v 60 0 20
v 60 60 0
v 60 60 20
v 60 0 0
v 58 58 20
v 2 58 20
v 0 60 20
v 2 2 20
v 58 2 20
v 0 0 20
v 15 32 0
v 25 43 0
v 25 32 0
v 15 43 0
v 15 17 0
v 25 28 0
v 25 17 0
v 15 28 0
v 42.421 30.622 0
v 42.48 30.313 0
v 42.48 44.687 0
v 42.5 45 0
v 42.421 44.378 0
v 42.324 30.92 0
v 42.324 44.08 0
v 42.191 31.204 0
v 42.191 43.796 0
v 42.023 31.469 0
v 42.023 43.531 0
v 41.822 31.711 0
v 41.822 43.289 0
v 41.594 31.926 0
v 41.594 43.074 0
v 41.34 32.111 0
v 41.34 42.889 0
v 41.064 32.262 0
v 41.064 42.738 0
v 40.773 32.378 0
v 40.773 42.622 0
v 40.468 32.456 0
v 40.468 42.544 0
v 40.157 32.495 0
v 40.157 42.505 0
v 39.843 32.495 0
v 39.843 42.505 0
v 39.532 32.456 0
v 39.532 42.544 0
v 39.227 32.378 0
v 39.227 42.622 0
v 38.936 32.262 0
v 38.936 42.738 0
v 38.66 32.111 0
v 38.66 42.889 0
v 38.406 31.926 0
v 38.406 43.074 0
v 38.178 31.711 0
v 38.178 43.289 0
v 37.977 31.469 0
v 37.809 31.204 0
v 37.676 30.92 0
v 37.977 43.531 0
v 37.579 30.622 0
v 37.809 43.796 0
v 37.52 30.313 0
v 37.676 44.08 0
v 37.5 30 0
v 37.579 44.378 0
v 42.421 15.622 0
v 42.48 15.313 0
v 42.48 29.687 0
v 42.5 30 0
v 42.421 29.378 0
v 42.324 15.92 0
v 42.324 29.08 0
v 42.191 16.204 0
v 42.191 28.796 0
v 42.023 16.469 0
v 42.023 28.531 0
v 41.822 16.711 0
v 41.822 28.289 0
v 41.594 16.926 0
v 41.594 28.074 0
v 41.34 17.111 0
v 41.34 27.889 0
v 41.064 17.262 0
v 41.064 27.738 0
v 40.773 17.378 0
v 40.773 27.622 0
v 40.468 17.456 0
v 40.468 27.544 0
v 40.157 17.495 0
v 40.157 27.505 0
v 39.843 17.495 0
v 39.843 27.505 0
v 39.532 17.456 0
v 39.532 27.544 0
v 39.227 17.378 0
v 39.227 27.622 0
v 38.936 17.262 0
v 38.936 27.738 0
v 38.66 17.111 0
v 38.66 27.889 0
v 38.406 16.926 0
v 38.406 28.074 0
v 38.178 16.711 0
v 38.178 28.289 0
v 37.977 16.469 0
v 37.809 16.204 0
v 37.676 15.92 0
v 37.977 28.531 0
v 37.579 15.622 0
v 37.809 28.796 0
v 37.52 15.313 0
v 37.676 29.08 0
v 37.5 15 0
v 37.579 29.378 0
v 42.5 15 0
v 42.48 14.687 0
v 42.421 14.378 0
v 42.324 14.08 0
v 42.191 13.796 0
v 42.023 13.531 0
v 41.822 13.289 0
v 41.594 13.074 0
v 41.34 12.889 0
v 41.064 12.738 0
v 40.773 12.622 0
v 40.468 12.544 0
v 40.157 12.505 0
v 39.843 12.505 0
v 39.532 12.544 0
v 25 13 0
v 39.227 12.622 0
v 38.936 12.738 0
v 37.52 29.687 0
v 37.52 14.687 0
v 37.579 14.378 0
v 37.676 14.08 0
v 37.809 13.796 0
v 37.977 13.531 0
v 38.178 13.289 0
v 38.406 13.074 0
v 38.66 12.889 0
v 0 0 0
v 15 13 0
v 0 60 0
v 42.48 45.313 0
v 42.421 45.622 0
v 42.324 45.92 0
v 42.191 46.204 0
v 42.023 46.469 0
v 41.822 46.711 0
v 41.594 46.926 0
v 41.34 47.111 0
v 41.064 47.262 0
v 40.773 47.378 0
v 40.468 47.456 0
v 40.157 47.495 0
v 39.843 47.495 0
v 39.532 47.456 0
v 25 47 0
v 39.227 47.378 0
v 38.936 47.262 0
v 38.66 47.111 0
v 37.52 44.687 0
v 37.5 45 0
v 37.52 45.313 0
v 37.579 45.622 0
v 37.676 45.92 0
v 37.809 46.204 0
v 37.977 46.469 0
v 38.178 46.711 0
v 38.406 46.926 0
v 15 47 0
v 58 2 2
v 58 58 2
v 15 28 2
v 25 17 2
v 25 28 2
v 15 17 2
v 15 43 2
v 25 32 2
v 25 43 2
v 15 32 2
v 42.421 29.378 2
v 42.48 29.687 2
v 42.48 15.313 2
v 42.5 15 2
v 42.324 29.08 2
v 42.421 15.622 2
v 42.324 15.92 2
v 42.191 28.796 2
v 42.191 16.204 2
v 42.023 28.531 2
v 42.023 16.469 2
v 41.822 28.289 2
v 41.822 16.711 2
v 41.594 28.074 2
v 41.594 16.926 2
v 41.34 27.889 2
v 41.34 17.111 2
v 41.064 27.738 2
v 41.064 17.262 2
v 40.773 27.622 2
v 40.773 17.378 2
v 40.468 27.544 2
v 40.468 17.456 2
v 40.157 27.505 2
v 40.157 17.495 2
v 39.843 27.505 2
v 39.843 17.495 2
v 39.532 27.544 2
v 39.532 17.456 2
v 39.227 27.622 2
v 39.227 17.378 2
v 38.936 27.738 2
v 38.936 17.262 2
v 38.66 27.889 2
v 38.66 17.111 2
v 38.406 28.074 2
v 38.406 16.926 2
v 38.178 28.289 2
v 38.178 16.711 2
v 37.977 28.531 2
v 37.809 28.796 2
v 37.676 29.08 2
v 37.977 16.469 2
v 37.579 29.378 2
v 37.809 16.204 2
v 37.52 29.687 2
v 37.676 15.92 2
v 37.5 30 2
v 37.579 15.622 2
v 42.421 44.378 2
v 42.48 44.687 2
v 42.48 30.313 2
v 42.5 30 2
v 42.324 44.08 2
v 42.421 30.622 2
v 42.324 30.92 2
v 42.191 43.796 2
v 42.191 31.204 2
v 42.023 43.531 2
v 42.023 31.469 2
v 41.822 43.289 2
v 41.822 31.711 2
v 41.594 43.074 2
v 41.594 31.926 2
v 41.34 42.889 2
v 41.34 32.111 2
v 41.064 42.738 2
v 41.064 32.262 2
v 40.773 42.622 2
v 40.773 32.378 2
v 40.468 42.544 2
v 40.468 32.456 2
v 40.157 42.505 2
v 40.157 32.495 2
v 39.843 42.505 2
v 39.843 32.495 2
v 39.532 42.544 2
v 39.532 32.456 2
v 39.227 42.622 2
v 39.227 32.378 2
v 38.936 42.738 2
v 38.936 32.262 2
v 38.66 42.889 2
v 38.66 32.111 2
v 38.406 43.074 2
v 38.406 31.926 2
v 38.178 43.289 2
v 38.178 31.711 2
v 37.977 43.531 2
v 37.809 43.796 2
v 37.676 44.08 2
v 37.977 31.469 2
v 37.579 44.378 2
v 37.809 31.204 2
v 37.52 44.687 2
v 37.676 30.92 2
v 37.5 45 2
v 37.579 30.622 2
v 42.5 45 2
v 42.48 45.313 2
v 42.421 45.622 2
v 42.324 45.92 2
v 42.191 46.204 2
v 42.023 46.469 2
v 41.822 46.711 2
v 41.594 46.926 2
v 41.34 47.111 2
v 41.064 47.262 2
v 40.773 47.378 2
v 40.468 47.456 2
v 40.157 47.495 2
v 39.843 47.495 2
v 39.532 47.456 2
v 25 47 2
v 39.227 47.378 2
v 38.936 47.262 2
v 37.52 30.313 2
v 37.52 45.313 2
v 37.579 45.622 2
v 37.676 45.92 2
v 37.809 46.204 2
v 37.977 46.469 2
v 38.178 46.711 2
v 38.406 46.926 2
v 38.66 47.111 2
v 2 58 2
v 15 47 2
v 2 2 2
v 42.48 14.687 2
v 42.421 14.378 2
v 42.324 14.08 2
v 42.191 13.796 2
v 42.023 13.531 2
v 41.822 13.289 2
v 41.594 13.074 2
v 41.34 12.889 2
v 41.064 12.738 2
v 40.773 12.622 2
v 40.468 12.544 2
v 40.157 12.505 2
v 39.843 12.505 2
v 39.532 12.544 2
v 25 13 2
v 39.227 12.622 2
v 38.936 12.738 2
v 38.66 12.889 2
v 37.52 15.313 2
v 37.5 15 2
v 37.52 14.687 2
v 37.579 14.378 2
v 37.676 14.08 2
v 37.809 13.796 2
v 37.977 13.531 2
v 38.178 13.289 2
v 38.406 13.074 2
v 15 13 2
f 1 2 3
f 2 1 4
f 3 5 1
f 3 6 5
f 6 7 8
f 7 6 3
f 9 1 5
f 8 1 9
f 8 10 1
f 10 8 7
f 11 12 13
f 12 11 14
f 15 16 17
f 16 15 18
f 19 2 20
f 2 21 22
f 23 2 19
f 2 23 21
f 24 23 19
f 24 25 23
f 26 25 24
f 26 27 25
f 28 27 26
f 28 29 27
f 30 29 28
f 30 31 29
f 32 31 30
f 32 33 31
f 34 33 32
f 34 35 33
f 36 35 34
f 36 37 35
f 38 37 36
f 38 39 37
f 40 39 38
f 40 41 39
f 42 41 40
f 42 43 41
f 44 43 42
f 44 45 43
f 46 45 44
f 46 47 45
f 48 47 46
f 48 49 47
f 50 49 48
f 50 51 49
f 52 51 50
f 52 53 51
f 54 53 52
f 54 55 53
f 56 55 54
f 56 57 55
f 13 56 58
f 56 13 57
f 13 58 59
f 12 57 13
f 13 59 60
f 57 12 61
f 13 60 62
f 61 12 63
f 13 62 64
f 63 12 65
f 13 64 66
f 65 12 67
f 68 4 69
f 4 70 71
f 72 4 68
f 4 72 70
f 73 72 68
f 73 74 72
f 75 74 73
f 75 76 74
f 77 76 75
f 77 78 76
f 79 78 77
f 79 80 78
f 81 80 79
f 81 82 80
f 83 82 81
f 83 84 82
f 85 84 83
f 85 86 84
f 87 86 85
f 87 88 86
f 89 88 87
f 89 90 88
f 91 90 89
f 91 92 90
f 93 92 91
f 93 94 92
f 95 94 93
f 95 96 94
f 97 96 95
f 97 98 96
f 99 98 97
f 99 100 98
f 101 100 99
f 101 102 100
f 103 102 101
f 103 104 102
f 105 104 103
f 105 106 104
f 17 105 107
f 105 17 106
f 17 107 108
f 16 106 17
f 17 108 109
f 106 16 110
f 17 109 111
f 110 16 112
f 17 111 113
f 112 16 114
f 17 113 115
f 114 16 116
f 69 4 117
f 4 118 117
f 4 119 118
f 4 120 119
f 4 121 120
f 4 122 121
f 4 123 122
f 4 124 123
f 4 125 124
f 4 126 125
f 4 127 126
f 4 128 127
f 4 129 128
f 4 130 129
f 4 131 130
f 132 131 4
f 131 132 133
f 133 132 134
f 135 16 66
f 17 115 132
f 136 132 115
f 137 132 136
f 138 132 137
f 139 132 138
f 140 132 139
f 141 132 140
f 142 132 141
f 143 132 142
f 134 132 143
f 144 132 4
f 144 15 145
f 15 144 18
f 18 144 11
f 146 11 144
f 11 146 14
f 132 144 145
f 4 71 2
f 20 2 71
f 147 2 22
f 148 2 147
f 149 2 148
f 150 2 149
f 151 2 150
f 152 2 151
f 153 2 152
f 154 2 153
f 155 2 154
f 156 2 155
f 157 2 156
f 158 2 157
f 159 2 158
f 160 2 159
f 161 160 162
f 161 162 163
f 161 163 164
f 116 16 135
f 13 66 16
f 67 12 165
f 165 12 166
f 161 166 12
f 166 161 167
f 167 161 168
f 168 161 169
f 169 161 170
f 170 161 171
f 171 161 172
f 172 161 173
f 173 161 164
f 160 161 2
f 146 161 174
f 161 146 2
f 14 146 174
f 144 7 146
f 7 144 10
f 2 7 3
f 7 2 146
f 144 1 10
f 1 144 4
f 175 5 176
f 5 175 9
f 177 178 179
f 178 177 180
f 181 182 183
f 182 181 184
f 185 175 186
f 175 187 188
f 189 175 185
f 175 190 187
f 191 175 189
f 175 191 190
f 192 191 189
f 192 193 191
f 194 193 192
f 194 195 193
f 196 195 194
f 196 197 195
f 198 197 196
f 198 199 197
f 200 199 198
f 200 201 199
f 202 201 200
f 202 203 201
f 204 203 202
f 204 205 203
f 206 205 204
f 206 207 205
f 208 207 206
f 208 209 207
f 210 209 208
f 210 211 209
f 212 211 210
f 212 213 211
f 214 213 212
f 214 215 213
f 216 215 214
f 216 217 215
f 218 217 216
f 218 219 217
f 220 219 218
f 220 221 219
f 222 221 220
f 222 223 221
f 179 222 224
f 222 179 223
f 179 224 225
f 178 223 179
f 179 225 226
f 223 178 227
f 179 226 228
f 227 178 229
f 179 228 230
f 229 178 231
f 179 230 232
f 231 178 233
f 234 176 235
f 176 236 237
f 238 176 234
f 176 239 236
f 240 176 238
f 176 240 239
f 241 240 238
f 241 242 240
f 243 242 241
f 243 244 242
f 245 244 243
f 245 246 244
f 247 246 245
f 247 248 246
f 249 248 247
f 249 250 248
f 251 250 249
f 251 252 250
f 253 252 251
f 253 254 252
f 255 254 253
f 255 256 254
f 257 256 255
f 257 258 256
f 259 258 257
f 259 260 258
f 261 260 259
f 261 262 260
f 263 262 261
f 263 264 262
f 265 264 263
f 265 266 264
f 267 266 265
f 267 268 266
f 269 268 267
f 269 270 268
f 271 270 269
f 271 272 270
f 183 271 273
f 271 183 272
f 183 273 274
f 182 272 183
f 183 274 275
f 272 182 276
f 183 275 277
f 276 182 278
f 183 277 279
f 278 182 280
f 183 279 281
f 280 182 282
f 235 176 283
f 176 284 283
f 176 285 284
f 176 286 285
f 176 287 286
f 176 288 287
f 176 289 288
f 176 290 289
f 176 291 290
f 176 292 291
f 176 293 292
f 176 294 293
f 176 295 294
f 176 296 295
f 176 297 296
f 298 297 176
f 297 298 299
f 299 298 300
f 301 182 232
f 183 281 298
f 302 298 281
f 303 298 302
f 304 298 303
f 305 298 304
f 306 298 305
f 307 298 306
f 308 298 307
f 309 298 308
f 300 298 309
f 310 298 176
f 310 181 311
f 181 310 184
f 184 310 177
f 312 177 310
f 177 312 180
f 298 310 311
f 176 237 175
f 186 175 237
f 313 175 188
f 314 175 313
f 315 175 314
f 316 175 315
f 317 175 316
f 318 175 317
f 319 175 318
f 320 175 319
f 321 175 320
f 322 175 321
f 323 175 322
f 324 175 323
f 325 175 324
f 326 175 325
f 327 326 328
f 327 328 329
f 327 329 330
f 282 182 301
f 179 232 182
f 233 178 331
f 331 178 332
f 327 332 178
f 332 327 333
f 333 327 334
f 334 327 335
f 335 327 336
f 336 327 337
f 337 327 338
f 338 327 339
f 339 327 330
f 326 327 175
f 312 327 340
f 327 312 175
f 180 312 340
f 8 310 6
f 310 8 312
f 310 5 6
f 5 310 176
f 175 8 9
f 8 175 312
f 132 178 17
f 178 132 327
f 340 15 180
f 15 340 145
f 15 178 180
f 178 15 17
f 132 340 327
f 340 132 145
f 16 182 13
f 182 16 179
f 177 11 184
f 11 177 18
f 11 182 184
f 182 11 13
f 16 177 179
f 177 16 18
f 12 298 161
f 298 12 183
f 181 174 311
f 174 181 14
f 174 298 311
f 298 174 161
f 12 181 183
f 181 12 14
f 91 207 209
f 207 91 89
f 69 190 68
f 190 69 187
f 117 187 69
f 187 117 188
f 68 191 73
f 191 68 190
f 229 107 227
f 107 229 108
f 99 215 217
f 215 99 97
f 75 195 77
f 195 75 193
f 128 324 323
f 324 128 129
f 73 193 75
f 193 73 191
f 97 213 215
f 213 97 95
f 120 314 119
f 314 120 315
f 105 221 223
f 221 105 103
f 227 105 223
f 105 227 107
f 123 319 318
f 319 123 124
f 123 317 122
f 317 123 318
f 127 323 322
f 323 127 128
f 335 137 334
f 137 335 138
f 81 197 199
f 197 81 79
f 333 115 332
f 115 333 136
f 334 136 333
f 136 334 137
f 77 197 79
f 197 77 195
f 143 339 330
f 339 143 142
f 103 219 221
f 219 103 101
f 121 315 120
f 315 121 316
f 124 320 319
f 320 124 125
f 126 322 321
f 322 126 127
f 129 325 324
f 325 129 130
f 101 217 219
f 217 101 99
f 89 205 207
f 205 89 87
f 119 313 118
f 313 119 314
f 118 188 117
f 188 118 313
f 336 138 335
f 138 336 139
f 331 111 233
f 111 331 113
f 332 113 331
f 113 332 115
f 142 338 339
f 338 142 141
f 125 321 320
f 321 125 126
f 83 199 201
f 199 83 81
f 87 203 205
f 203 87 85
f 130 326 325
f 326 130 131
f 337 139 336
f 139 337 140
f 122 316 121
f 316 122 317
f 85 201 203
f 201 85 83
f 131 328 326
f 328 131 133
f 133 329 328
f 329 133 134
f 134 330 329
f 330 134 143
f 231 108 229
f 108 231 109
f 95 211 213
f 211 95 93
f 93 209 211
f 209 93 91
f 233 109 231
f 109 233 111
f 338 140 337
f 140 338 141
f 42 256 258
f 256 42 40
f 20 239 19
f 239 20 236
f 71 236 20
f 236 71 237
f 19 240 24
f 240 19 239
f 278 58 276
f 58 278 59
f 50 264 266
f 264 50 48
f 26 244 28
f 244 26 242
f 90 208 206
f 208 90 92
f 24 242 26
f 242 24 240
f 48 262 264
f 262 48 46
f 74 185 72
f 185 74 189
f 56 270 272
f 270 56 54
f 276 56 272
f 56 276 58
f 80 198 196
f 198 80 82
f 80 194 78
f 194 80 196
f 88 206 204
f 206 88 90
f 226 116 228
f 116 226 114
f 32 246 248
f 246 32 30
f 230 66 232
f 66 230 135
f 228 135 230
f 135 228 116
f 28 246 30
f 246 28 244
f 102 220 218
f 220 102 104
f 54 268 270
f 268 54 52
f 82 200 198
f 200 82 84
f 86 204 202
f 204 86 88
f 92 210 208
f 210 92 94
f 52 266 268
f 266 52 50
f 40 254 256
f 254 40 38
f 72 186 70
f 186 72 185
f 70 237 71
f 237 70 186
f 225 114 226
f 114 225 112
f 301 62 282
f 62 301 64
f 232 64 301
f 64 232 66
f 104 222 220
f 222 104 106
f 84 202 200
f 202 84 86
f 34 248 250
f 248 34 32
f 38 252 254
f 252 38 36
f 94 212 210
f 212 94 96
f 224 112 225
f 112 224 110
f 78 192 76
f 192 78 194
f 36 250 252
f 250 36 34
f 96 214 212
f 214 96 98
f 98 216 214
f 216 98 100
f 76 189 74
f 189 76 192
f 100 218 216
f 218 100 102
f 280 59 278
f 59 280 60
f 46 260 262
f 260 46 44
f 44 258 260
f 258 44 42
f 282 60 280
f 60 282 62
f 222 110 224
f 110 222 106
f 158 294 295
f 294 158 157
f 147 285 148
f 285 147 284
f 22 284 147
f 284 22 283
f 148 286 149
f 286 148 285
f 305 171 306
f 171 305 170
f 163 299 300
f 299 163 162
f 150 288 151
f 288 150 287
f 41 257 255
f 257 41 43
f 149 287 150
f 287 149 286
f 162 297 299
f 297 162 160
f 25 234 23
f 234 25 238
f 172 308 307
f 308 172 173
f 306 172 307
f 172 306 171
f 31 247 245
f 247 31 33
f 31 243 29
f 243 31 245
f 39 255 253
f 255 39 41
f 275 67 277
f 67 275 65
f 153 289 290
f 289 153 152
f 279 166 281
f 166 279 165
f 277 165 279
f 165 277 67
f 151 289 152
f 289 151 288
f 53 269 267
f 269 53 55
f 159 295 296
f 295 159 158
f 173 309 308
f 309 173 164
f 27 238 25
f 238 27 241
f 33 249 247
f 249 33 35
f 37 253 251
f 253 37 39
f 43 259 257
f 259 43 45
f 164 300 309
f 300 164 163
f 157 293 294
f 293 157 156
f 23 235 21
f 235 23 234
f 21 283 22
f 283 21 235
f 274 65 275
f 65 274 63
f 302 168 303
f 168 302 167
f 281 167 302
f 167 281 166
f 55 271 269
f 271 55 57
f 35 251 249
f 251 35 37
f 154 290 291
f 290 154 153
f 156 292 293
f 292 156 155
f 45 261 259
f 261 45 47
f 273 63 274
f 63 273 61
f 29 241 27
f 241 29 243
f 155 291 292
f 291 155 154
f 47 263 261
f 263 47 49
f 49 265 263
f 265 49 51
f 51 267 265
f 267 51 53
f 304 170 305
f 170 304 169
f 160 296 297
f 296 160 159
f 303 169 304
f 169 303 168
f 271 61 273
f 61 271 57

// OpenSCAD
wand = 2;
breite = 60;
laenge = 60;
hoehe = 20;

rled = 2.5;
dipbreite = 4;
diplaenge = 10;

$fn = 50;

difference()
{
    cube([breite, laenge, hoehe]);
    translate([wand,wand,wand])
        cube([breite-2*wand,laenge-2*wand,hoehe-wand]);
    translate([15,laenge*0.25-0.5*dipbreite,0])
        cube([diplaenge,dipbreite,wand]);
    translate([15,laenge*0.5-0.5*dipbreite,0])
        cube([diplaenge,dipbreite,wand]);
    translate([15,laenge*0.75-0.5*dipbreite,0])
        cube([diplaenge,dipbreite,wand]);
    translate([15+diplaenge+15,laenge*0.25,0])
        cylinder(r=rled,h=wand);
    translate([15+diplaenge+15,laenge*0.5,0])
        cylinder(r=rled,h=wand);
    translate([15+diplaenge+15,laenge*0.75,0])
        cylinder(r=rled,h=wand);
}
